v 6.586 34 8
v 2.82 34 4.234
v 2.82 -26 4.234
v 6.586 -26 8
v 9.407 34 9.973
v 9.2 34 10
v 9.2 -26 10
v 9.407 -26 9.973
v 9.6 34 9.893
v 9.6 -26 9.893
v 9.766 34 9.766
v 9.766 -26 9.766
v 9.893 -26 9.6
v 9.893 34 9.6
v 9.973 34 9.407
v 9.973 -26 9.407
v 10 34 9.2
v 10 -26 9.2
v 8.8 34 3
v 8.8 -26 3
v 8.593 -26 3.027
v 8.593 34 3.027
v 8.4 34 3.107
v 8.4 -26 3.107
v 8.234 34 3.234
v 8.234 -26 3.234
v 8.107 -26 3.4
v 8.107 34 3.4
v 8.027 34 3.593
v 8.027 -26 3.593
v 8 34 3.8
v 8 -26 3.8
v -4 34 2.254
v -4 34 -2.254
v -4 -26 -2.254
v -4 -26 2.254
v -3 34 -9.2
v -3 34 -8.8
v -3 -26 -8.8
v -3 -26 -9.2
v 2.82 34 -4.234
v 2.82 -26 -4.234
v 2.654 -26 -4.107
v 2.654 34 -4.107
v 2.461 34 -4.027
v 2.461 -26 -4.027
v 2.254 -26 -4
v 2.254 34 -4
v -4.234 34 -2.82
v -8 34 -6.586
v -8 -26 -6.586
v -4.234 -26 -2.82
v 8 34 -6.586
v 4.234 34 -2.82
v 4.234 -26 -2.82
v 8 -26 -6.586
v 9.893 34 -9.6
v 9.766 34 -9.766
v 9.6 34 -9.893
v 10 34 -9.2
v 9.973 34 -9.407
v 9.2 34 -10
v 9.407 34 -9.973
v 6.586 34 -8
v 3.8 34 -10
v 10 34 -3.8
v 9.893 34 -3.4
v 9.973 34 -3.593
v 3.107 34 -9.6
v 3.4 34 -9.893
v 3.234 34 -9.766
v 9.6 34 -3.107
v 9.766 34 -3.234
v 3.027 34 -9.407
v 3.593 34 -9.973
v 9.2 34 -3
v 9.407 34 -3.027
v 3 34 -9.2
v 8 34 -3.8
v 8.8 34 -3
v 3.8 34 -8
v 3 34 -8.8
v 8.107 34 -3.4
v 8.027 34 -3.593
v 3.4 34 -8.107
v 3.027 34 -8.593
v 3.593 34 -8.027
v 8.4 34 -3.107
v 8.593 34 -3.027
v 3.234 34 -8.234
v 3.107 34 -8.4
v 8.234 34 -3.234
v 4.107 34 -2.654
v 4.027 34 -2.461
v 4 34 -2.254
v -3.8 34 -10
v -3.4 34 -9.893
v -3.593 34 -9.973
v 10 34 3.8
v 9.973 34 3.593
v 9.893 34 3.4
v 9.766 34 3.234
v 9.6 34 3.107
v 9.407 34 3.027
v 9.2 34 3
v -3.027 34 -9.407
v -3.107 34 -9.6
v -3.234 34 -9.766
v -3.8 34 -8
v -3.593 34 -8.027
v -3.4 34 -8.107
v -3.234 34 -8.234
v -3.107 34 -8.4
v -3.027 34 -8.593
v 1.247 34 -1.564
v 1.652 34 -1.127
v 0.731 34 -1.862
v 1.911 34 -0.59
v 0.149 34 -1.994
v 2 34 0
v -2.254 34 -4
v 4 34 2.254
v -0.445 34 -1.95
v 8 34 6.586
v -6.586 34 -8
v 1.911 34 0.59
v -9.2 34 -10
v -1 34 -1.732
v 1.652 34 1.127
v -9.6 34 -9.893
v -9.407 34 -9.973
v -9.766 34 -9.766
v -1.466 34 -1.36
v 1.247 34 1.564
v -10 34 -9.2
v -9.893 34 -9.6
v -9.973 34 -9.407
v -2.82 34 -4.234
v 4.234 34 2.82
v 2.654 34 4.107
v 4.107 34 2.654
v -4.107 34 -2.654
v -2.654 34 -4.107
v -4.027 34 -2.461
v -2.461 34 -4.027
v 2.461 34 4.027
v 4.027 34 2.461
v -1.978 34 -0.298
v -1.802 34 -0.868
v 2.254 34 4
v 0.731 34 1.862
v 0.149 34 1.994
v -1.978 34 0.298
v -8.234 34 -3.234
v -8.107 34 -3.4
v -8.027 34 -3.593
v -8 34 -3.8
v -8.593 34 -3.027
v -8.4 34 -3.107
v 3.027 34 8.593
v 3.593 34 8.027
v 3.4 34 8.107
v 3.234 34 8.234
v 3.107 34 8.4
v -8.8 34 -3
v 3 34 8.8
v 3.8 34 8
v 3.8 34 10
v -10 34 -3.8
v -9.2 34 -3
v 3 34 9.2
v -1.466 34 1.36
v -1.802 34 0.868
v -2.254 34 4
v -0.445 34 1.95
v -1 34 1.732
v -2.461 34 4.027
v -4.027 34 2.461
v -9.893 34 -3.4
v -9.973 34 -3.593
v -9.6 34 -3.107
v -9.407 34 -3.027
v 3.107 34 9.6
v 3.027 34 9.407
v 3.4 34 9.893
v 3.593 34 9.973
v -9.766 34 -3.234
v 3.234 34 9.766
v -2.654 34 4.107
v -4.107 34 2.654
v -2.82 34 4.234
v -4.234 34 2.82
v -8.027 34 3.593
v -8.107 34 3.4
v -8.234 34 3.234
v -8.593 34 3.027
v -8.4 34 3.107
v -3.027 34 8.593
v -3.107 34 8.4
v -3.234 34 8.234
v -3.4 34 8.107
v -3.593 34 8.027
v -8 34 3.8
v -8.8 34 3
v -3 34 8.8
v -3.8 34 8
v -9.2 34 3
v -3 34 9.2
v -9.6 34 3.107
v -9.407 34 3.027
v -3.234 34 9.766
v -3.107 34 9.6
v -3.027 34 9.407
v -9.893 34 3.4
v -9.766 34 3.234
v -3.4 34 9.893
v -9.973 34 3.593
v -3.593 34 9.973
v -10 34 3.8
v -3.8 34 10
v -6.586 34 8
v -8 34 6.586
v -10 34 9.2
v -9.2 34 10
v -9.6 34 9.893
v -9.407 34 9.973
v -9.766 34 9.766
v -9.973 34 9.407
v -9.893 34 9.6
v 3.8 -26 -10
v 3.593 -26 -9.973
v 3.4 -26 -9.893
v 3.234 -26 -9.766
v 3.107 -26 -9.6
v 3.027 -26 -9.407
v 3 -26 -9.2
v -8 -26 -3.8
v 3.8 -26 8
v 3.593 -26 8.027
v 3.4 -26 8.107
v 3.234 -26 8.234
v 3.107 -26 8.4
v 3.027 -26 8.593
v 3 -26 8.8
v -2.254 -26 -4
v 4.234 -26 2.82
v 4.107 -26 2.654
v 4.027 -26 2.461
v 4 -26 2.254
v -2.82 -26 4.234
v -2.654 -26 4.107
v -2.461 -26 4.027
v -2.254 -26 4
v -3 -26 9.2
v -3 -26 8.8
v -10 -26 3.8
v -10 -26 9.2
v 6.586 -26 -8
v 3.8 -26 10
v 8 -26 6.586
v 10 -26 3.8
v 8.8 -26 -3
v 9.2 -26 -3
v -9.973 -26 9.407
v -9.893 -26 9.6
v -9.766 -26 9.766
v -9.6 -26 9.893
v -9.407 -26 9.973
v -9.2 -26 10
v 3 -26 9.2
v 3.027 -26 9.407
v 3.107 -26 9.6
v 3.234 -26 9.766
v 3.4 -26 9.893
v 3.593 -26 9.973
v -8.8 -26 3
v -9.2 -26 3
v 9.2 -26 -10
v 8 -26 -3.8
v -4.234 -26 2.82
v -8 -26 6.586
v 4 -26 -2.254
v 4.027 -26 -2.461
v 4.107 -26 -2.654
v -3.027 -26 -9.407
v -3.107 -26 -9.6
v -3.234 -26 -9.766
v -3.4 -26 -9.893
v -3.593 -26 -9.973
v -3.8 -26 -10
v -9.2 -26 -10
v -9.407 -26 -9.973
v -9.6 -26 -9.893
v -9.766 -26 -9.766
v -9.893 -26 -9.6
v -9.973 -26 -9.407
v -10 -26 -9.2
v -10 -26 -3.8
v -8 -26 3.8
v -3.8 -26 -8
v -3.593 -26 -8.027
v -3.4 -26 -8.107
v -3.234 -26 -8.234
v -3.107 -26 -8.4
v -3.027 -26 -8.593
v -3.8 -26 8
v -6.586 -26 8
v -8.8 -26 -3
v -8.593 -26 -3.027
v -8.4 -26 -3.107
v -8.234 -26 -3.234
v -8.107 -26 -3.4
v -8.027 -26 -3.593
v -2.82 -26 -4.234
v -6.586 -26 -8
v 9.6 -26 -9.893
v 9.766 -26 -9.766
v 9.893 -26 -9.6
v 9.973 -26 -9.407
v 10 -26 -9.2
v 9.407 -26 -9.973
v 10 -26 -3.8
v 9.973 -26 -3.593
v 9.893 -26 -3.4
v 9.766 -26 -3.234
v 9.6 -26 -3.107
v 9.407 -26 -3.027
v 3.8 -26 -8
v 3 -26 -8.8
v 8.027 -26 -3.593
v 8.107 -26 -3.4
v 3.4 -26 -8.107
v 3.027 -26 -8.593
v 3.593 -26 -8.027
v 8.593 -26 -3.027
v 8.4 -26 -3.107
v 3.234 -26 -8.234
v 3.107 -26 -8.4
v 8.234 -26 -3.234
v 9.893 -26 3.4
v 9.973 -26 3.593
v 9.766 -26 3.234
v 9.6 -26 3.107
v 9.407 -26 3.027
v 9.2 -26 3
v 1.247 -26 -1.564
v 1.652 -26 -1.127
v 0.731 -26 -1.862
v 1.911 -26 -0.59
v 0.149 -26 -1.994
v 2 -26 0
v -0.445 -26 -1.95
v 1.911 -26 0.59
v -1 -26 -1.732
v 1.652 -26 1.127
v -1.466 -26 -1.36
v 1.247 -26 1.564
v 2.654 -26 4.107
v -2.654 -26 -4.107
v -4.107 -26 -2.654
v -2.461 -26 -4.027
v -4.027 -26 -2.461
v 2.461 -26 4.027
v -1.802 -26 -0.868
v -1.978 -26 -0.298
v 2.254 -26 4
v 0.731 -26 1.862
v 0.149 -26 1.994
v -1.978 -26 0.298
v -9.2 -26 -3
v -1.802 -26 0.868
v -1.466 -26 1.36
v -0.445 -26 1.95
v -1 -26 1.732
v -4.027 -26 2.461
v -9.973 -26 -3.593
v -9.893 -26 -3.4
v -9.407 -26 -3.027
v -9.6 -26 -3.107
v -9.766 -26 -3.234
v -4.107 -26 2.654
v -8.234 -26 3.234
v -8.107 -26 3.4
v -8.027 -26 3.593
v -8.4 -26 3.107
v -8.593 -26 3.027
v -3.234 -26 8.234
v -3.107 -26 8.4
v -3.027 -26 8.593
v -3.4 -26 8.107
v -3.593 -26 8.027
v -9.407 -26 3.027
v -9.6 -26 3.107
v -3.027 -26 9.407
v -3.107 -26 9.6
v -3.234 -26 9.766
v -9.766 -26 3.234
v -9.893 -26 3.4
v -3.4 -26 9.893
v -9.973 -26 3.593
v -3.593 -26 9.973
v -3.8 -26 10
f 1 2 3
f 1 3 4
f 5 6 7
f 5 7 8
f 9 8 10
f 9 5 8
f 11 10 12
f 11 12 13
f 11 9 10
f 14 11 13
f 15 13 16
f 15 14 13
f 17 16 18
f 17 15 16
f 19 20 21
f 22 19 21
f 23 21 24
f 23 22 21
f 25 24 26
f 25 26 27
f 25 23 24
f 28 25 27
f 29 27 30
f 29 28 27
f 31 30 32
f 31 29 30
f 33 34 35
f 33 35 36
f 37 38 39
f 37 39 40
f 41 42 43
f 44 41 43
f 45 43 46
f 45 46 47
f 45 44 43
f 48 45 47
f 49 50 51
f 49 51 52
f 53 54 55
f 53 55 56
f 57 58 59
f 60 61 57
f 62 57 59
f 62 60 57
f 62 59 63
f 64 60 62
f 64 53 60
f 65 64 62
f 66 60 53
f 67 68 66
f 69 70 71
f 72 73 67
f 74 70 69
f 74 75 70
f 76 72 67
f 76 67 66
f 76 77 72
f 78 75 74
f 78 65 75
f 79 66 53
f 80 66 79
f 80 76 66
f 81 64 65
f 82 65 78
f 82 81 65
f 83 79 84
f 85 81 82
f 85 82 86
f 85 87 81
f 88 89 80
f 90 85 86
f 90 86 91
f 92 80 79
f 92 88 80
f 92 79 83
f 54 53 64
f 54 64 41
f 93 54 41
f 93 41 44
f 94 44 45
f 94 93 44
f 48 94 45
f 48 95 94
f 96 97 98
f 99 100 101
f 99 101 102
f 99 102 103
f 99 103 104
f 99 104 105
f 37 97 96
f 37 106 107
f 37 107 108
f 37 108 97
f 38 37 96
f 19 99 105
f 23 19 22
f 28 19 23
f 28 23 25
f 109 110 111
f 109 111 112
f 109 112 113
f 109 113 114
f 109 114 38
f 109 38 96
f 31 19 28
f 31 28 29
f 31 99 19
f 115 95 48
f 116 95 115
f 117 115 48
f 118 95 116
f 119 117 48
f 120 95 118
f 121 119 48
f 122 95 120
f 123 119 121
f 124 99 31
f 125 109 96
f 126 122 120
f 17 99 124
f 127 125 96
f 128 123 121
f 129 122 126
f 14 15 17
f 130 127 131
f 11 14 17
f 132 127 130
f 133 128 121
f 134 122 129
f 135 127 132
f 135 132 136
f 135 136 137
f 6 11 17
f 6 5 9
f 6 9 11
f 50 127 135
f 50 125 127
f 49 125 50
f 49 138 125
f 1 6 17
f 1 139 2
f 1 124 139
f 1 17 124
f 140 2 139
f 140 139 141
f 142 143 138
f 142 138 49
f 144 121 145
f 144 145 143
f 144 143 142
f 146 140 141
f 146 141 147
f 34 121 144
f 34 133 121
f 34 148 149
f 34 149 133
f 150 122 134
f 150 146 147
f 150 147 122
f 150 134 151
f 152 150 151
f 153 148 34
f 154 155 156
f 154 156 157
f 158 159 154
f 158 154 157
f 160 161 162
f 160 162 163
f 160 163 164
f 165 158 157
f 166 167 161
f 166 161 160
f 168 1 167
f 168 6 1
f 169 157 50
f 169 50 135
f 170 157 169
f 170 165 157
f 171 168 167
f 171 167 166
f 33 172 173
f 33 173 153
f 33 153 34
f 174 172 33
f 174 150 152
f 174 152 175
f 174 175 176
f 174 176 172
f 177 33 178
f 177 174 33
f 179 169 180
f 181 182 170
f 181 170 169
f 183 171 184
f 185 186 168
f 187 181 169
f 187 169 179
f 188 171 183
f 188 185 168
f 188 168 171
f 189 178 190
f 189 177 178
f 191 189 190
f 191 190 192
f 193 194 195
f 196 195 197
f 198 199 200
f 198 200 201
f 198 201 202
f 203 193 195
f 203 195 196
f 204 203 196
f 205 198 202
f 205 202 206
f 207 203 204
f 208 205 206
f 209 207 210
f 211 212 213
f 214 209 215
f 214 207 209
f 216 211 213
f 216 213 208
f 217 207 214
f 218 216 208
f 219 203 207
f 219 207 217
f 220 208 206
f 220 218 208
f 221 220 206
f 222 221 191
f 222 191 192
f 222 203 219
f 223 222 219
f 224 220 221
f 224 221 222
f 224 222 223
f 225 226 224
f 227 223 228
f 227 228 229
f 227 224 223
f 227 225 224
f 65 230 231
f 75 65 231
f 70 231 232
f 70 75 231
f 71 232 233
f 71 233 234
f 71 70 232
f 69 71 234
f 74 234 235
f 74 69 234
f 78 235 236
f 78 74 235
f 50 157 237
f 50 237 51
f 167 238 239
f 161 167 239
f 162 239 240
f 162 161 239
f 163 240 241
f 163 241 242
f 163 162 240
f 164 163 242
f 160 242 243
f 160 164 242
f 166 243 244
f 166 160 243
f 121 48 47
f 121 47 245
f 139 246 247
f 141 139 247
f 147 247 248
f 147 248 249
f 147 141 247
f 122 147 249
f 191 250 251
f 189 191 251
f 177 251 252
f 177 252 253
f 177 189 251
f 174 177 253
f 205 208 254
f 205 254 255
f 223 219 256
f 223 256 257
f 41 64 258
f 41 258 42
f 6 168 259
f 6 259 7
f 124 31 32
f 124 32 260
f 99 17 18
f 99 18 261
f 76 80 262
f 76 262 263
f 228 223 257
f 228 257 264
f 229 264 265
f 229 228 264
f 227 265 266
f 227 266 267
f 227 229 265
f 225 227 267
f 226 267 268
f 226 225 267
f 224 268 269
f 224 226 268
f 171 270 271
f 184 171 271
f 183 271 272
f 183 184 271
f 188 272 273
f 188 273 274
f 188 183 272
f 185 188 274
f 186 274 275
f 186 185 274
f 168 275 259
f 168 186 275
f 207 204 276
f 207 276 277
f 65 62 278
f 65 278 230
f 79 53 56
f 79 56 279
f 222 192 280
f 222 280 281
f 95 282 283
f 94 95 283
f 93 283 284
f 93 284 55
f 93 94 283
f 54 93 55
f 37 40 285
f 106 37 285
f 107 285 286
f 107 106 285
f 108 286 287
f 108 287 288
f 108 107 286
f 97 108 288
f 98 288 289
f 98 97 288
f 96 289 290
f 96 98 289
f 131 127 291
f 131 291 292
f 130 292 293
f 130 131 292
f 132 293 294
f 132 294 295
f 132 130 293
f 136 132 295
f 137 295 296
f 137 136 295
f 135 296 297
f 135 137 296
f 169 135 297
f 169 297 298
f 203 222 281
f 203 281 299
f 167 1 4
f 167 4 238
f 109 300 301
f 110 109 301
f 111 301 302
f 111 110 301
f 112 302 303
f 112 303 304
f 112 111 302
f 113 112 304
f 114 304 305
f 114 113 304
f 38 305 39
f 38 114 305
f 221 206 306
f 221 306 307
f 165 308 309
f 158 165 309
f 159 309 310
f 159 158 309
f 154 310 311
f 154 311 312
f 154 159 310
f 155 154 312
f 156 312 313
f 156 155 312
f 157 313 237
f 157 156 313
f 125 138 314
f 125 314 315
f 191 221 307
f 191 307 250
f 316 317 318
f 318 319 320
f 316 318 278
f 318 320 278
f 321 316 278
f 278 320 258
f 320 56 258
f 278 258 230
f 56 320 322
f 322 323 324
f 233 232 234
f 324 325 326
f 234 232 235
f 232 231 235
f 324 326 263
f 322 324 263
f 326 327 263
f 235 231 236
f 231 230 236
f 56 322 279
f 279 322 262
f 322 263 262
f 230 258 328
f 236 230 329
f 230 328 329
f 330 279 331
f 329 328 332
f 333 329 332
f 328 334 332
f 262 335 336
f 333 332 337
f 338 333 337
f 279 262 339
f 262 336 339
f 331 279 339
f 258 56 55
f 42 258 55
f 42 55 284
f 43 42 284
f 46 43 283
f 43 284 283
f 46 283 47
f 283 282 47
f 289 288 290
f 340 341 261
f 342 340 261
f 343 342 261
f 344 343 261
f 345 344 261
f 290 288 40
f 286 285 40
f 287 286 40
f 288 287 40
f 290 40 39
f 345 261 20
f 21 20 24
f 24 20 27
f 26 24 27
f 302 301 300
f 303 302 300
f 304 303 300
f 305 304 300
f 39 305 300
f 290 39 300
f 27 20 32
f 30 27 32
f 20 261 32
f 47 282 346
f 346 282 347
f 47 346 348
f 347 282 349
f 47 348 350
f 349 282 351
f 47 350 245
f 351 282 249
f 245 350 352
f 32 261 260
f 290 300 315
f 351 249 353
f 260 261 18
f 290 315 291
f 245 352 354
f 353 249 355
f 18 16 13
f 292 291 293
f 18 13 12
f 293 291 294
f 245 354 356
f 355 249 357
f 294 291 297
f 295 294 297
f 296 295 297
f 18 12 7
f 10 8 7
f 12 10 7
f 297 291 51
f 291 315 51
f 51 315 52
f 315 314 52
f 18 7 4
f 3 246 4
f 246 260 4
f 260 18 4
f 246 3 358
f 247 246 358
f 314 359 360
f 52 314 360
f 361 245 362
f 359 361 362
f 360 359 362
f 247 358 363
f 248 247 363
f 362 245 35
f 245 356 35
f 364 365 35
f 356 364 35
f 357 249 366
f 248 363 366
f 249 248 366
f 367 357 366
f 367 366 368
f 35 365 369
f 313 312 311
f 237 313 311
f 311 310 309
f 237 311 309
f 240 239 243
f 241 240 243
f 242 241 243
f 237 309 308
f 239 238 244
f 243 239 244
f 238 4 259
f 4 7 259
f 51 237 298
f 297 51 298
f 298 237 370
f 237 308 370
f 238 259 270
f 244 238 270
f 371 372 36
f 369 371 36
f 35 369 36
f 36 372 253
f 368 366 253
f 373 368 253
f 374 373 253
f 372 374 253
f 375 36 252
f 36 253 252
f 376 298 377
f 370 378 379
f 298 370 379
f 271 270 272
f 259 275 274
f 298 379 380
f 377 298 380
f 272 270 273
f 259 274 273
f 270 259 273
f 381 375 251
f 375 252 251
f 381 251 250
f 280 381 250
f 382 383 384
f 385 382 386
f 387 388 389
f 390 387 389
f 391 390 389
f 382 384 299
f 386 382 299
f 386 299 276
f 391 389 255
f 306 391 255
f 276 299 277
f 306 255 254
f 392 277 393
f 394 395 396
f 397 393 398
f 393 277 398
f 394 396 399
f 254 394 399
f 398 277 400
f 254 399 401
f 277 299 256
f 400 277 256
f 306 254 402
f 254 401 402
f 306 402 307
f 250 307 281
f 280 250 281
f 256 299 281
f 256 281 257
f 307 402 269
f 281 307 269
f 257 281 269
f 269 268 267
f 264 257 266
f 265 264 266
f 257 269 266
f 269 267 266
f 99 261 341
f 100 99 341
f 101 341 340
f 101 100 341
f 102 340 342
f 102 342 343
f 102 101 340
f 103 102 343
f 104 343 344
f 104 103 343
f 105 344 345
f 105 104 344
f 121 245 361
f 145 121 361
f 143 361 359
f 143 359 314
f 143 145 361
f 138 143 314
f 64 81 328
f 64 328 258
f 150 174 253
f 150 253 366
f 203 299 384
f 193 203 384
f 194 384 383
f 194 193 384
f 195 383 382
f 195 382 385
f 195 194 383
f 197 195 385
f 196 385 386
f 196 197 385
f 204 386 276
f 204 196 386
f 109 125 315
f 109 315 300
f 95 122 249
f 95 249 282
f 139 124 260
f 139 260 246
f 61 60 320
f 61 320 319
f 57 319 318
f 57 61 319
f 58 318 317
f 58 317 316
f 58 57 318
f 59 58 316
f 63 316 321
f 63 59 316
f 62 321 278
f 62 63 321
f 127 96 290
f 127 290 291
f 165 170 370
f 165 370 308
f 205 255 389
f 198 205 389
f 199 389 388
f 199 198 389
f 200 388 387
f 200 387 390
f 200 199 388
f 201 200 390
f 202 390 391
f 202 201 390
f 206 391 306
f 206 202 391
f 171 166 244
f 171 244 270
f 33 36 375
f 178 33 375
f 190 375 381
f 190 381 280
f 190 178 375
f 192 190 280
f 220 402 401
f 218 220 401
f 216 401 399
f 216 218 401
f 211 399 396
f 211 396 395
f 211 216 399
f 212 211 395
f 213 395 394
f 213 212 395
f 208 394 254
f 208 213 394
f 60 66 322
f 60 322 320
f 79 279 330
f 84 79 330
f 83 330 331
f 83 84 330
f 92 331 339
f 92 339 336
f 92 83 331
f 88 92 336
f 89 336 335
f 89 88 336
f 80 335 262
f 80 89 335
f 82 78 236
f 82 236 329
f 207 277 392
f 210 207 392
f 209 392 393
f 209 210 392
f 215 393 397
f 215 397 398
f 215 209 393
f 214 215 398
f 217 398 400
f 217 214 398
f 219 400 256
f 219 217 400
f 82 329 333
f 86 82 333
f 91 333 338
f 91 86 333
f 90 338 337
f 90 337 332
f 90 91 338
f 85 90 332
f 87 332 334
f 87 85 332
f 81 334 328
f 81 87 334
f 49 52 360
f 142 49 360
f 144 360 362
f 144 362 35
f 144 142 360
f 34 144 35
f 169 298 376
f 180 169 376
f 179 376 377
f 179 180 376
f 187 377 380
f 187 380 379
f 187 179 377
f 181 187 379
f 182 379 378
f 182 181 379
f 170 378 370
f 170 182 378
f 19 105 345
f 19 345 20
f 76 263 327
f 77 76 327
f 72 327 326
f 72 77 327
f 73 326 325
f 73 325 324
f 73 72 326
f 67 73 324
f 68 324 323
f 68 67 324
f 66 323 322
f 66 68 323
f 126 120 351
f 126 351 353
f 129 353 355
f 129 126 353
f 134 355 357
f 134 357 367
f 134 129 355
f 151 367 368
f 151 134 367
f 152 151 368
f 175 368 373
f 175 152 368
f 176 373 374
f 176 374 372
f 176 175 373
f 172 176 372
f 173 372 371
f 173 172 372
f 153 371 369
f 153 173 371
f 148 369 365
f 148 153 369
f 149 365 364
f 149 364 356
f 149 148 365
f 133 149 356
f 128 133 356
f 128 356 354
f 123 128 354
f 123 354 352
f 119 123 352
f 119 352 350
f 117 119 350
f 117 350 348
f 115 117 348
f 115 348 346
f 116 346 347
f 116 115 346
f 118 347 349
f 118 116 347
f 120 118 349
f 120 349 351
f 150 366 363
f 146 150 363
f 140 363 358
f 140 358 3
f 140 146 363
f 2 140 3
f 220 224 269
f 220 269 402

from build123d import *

# Parameters (mm, degrees)
SKETCH1_R           = 2
PROFILE_4X4_1_DEPTH = 60


with BuildPart() as part:
    # Sketch1 → Profile 4X4(1) (new body)
    with BuildSketch(Plane.XZ.offset(-34)):
        with BuildLine():
            Line((-3, 9.2), (-3, 8.8))
            ThreePointArc((-3, 8.8), (-3.234314575, 8.234314575), (-3.8, 8))
            Line((-3.8, 8), (-6.585786438, 8))
            Line((-6.585786438, 8), (-2.820101013, 4.234314575))
            ThreePointArc((-2.820101013, 4.234314575), (-2.560562334, 4.060896374), (-2.254415588, 4))
            Line((-2.254415588, 4), (2.254415588, 4))
            ThreePointArc((2.254415588, 4), (2.560562334, 4.060896374), (2.820101013, 4.234314575))
            Line((2.820101013, 4.234314575), (6.585786438, 8))
            Line((6.585786438, 8), (3.8, 8))
            ThreePointArc((3.8, 8), (3.234314575, 8.234314575), (3, 8.8))
            Line((3, 8.8), (3, 9.2))
            ThreePointArc((3, 9.2), (3.234314575, 9.765685425), (3.8, 10))
            Line((3.8, 10), (9.2, 10))
            ThreePointArc((9.2, 10), (9.765685425, 9.765685425), (10, 9.2))
            Line((10, 9.2), (10, 3.8))
            ThreePointArc((10, 3.8), (9.765685425, 3.234314575), (9.2, 3))
            Line((9.2, 3), (8.8, 3))
            ThreePointArc((8.8, 3), (8.234314575, 3.234314575), (8, 3.8))
            Line((8, 3.8), (8, 6.585786438))
            Line((8, 6.585786438), (4.234314575, 2.820101013))
            ThreePointArc((4.234314575, 2.820101013), (4.060896374, 2.560562334), (4, 2.254415588))
            Line((4, 2.254415588), (4, -2.254415588))
            ThreePointArc((4, -2.254415588), (4.060896374, -2.560562334), (4.234314575, -2.820101013))
            Line((4.234314575, -2.820101013), (8, -6.585786438))
            Line((8, -6.585786438), (8, -3.8))
            ThreePointArc((8, -3.8), (8.234314575, -3.234314575), (8.8, -3))
            Line((8.8, -3), (9.2, -3))
            ThreePointArc((9.2, -3), (9.765685425, -3.234314575), (10, -3.8))
            Line((10, -3.8), (10, -9.2))
            ThreePointArc((10, -9.2), (9.765685425, -9.765685425), (9.2, -10))
            Line((9.2, -10), (3.8, -10))
            ThreePointArc((3.8, -10), (3.234314575, -9.765685425), (3, -9.2))
            Line((3, -9.2), (3, -8.8))
            ThreePointArc((3, -8.8), (3.234314575, -8.234314575), (3.8, -8))
            Line((3.8, -8), (6.585786438, -8))
            Line((6.585786438, -8), (2.820101013, -4.234314575))
            ThreePointArc((2.820101013, -4.234314575), (2.560562334, -4.060896374), (2.254415588, -4))
            Line((2.254415588, -4), (-2.254415588, -4))
            ThreePointArc((-2.254415588, -4), (-2.560562334, -4.060896374), (-2.820101013, -4.234314575))
            Line((-2.820101013, -4.234314575), (-6.585786438, -8))
            Line((-6.585786438, -8), (-3.8, -8))
            ThreePointArc((-3.8, -8), (-3.234314575, -8.234314575), (-3, -8.8))
            Line((-3, -8.8), (-3, -9.2))
            ThreePointArc((-3, -9.2), (-3.234314575, -9.765685425), (-3.8, -10))
            Line((-3.8, -10), (-9.2, -10))
            ThreePointArc((-9.2, -10), (-9.765685425, -9.765685425), (-10, -9.2))
            Line((-10, -9.2), (-10, -3.8))
            ThreePointArc((-10, -3.8), (-9.765685425, -3.234314575), (-9.2, -3))
            Line((-9.2, -3), (-8.8, -3))
            ThreePointArc((-8.8, -3), (-8.234314575, -3.234314575), (-8, -3.8))
            Line((-8, -3.8), (-8, -6.585786438))
            Line((-8, -6.585786438), (-4.234314575, -2.820101013))
            ThreePointArc((-4.234314575, -2.820101013), (-4.060896374, -2.560562334), (-4, -2.254415588))
            Line((-4, -2.254415588), (-4, 2.254415588))
            ThreePointArc((-4, 2.254415588), (-4.060896374, 2.560562334), (-4.234314575, 2.820101013))
            Line((-4.234314575, 2.820101013), (-8, 6.585786438))
            Line((-8, 6.585786438), (-8, 3.8))
            ThreePointArc((-8, 3.8), (-8.234314575, 3.234314575), (-8.8, 3))
            Line((-8.8, 3), (-9.2, 3))
            ThreePointArc((-9.2, 3), (-9.765685425, 3.234314575), (-10, 3.8))
            Line((-10, 3.8), (-10, 9.2))
            ThreePointArc((-10, 9.2), (-9.765685425, 9.765685425), (-9.2, 10))
            Line((-9.2, 10), (-3.8, 10))
            ThreePointArc((-3.8, 10), (-3.234314575, 9.765685425), (-3, 9.2))
        make_face()
        Circle(SKETCH1_R, mode=Mode.SUBTRACT)
    extrude(amount=PROFILE_4X4_1_DEPTH)


solid = part.part
